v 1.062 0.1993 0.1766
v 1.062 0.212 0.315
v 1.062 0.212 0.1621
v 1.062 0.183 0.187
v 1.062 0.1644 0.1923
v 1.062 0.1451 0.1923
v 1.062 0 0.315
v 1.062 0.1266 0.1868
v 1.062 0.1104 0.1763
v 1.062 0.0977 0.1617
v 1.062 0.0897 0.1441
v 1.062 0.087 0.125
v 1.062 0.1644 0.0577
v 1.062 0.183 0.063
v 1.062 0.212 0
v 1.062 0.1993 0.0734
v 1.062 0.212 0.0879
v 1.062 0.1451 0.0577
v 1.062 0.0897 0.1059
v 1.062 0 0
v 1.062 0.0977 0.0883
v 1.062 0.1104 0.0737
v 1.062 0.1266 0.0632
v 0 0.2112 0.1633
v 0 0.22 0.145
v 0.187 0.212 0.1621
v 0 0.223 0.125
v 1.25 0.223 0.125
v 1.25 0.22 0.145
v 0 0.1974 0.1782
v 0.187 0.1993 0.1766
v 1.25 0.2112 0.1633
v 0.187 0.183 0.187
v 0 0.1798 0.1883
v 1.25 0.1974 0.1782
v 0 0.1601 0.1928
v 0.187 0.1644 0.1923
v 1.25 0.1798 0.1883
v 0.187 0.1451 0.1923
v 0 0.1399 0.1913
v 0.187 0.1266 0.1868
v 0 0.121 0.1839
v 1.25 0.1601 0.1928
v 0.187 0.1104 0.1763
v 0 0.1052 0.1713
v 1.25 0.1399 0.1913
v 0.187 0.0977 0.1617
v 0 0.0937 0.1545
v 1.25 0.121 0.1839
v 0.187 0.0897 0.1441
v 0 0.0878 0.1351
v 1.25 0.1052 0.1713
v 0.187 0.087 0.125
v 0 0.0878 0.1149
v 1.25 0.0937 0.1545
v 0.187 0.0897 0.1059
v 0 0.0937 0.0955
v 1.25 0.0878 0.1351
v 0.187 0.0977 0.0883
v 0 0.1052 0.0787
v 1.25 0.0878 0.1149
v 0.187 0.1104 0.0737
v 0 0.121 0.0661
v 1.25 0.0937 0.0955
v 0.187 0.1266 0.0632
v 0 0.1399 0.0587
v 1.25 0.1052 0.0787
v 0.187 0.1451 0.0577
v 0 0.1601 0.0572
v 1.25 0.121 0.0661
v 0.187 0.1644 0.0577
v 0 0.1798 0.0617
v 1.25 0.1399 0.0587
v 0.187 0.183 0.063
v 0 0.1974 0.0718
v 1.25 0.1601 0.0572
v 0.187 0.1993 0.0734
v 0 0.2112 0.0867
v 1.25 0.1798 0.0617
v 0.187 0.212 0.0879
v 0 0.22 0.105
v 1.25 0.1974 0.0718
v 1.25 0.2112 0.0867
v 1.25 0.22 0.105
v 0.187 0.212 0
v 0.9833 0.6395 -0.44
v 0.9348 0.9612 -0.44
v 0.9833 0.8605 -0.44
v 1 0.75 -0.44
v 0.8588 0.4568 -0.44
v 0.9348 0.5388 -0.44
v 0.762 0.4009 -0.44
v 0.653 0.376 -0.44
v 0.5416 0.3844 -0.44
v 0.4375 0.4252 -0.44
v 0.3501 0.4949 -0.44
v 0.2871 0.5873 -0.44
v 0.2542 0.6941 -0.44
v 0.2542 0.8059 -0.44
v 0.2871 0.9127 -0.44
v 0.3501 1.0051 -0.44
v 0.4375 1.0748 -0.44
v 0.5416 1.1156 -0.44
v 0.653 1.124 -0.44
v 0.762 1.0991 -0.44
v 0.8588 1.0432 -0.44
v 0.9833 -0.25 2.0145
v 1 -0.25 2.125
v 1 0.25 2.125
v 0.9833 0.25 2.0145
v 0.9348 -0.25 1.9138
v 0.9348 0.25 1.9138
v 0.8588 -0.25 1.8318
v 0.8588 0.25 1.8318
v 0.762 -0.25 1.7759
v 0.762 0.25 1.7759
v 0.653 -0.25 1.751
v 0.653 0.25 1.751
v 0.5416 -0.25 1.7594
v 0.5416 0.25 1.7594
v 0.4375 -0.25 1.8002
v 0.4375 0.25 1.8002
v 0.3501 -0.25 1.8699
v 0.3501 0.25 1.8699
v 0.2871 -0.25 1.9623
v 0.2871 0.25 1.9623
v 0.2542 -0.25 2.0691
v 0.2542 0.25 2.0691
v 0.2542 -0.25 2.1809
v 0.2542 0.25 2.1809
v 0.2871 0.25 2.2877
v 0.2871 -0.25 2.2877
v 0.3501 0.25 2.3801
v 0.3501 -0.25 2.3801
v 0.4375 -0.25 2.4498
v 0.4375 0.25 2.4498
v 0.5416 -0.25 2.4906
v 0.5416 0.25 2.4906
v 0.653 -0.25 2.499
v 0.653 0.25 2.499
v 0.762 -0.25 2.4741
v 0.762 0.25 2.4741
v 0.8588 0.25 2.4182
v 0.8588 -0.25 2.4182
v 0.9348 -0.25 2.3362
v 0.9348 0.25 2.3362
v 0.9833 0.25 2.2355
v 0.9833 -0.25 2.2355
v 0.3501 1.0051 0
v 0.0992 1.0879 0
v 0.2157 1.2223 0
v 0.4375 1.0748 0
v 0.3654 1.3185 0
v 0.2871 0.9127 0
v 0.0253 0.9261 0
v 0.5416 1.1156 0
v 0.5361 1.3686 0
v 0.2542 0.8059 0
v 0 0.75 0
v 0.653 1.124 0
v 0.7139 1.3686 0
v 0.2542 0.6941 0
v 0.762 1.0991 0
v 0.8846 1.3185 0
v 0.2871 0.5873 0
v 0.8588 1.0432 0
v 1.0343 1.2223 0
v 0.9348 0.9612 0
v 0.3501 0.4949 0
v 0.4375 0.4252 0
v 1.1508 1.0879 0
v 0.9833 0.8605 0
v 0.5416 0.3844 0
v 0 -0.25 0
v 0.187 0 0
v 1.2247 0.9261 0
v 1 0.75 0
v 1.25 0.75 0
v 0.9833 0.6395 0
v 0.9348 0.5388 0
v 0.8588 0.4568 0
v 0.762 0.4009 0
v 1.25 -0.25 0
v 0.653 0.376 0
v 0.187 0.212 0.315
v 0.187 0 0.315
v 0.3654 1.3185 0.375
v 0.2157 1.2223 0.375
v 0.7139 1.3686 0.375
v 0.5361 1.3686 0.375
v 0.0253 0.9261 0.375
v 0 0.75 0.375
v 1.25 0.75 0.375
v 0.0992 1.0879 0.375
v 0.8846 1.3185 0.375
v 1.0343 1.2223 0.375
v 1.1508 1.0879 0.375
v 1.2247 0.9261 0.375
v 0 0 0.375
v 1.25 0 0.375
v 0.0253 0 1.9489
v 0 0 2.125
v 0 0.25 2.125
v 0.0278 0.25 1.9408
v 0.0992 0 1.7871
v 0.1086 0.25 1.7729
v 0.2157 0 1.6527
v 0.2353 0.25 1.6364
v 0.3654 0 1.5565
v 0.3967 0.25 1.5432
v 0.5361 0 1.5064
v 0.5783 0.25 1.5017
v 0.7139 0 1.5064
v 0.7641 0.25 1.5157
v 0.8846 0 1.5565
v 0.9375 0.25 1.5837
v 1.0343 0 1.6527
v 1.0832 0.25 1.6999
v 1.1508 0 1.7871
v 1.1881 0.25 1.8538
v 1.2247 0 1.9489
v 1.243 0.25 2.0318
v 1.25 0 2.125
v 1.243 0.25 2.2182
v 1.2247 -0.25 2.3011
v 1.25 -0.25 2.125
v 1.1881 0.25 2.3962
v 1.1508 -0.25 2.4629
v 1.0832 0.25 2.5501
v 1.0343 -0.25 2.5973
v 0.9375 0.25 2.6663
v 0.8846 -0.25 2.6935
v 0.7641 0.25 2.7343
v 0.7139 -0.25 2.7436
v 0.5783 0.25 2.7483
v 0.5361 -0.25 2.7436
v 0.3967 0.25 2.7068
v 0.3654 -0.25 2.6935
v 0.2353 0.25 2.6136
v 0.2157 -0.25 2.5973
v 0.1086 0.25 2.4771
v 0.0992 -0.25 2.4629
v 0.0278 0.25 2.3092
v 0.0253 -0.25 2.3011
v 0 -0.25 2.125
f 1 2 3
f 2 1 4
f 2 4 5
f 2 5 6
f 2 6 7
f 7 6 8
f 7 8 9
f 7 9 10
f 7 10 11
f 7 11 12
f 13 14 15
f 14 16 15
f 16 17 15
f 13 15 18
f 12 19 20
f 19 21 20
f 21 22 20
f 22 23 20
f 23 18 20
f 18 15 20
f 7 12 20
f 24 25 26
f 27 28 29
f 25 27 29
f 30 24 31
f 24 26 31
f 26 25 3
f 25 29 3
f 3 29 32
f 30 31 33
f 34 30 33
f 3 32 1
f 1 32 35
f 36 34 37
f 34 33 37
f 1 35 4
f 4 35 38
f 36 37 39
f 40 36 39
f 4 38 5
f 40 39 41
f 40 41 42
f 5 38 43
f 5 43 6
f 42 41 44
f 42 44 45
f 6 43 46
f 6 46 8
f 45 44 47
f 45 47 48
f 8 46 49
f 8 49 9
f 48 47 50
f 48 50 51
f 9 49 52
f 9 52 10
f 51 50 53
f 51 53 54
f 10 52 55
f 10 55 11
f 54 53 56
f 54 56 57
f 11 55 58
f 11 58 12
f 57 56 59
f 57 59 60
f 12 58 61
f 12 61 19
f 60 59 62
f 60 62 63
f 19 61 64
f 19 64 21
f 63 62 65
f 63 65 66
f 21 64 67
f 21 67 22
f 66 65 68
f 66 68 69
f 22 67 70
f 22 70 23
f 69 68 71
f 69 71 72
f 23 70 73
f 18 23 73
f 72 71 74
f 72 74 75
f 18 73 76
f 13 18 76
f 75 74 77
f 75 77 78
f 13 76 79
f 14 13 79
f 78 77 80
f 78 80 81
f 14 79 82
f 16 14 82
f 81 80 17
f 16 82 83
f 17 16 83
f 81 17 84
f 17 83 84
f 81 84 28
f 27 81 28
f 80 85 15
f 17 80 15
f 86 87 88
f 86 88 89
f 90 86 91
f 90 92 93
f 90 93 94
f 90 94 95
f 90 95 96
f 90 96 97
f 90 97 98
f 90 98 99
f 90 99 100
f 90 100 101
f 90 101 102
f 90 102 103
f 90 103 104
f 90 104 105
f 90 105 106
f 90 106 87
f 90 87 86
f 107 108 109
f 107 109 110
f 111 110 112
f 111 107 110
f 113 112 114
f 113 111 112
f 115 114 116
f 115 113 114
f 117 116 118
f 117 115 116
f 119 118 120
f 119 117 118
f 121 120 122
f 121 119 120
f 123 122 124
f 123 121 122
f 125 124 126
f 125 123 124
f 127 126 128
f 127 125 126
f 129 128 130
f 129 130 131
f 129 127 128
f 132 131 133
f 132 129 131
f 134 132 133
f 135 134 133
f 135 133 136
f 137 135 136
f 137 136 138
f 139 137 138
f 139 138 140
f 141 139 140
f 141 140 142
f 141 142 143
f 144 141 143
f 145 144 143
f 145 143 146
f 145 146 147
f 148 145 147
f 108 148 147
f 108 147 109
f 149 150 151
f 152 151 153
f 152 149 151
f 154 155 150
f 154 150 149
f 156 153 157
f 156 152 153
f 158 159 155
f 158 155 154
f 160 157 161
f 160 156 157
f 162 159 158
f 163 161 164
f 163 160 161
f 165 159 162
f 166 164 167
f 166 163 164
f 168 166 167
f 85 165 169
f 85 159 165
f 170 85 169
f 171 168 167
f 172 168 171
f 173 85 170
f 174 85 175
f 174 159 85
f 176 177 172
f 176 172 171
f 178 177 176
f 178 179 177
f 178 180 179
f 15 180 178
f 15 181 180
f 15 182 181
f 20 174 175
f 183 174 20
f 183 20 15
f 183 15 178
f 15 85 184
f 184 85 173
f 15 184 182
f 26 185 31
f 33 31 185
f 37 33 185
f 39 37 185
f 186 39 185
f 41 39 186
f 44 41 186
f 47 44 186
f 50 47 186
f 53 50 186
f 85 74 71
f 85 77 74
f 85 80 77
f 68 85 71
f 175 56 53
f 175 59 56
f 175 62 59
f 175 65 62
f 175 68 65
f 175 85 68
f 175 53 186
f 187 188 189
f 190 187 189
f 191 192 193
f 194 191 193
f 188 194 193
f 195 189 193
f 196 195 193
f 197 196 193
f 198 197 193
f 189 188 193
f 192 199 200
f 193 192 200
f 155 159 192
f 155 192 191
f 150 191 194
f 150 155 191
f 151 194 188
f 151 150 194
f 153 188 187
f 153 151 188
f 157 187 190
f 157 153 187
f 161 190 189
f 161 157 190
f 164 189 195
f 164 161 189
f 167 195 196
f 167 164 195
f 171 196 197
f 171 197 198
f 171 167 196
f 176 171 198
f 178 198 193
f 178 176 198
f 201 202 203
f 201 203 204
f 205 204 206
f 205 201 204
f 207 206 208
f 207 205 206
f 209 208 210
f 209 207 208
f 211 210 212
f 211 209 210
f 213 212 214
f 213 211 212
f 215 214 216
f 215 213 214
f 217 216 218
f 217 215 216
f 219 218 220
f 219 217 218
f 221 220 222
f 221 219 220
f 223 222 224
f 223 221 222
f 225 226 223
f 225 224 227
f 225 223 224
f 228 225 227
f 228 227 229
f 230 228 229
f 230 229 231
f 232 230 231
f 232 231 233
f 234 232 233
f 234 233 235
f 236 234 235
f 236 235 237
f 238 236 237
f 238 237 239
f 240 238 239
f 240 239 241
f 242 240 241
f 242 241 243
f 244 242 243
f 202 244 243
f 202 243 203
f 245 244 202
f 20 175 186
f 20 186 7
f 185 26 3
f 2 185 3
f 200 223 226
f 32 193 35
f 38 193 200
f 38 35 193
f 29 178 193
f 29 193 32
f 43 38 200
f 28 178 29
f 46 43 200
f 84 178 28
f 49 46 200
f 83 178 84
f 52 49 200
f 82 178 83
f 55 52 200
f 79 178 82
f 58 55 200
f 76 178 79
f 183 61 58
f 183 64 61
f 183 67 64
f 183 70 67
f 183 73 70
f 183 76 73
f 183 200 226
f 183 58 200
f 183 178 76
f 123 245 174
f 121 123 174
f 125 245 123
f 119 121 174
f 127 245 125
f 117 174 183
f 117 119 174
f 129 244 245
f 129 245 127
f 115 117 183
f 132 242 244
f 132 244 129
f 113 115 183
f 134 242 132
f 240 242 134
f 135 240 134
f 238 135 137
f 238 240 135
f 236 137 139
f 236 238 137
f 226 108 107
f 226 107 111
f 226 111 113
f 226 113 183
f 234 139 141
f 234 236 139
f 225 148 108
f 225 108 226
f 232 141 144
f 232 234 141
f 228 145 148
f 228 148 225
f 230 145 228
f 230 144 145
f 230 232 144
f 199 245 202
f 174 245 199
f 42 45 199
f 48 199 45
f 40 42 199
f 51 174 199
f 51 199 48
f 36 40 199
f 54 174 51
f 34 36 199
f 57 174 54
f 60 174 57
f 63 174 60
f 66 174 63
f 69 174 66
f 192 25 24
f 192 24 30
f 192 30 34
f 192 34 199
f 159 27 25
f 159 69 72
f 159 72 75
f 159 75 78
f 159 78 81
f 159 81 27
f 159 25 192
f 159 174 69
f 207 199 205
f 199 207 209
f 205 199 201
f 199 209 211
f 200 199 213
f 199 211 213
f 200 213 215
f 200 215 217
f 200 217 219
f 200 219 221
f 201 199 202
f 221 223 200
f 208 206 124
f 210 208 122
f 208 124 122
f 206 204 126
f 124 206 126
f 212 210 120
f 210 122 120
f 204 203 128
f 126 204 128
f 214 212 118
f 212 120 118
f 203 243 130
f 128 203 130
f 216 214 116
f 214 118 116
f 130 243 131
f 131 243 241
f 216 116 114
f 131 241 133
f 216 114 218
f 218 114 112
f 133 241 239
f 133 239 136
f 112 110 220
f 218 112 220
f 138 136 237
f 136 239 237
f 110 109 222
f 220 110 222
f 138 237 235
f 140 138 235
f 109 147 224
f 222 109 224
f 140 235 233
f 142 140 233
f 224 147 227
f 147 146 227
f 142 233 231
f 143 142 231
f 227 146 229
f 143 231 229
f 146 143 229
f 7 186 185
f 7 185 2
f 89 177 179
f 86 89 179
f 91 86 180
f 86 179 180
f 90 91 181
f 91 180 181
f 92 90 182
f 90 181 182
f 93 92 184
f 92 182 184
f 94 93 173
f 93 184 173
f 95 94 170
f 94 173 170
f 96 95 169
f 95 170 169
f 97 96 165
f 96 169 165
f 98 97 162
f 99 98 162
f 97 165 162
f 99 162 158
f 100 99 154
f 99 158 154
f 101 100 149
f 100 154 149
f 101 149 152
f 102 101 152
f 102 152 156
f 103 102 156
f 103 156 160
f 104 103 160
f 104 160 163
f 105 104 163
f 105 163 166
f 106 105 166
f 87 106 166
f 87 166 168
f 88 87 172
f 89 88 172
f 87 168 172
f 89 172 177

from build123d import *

# Parameters (mm, degrees)
F0_W      = 1.25
F0_H      = 2.125
F1_DEPTH  = 0.25
F3_DEPTH  = 0.5
F5_DEPTH  = 25
F7_DEPTH  = 0.375
F8_R      = 0.375
F9_DEPTH  = 0.44
F10_W     = 0.875
F10_H     = 0.2119794213
F11_DEPTH = 0.315
F12_R     = 0.068
F13_DEPTH = 1.251


with BuildPart() as f1:
    # F0 (on Front) → F1 (new body)
    with BuildSketch(Plane.XZ):
        with Locations((0.625, 1.0625)):
            Rectangle(F0_W, F0_H)
    extrude(amount=F1_DEPTH)

    # F2 (on face) → F3 (join)
    with BuildSketch(Plane.XZ.offset(0.25)):
        with BuildLine():
            Line((1, 2.125), (1.25, 2.125))
            ThreePointArc((1.25, 2.125), (0.625, 2.75), (0, 2.125))
            Line((0, 2.125), (0.25, 2.125))
            ThreePointArc((0.25, 2.125), (0.625, 2.5), (1, 2.125))
        make_face()
        with BuildLine():
            ThreePointArc((0, 2.125), (0.625, 1.5), (1.25, 2.125))
            Line((1.25, 2.125), (1, 2.125))
            ThreePointArc((1, 2.125), (0.625, 1.75), (0.25, 2.125))
            Line((0.25, 2.125), (0, 2.125))
        make_face()
    extrude(amount=-F3_DEPTH)

    # F4 (on face) → F5 (cut)
    with BuildSketch(Plane(origin=(0, 0, 0), x_dir=(-1, 0, 0), z_dir=(0, 1, 0))):
        with BuildLine():
            Line((-0.25, 2.125), (-1, 2.125))
            ThreePointArc((-1, 2.125), (-0.625, 1.75), (-0.25, 2.125))
        make_face()
    extrude(amount=-F5_DEPTH, mode=Mode.SUBTRACT)

    # F6 (on face) → F7 (join)
    with BuildSketch(Plane(origin=(0, 0, 0), x_dir=(1, 0, 0), z_dir=(0, 0, -1))):
        with BuildLine():
            Line((1.25, -0.75), (1.25, 0.25))
            Line((1.25, 0.25), (0, 0.25))
            Line((0, 0.25), (0, -0.75))
            ThreePointArc((0, -0.75), (0.625, -1.375), (1.25, -0.75))
        make_face()
    extrude(amount=-F7_DEPTH)

    # F8 (on face) → F9 (join)
    with BuildSketch(Plane(origin=(0, 0, 0), x_dir=(1, 0, 0), z_dir=(0, 0, -1))):
        with Locations((0.625, -0.75)):
            Circle(F8_R)
    extrude(amount=F9_DEPTH)

    # F10 (on face) → F11 (cut)
    with BuildSketch(Plane(origin=(0, 0, 0), x_dir=(1, 0, 0), z_dir=(0, 0, -1))):
        with Locations((0.6245, -0.1059897106)):
            Rectangle(F10_W, F10_H)
    extrude(amount=-F11_DEPTH, mode=Mode.SUBTRACT)

    # F12 (on face) → F13 (cut, through all)
    with BuildSketch(Plane.YZ.offset(1.25)):
        with Locations((0.155, 0.125)):
            Circle(F12_R)
    extrude(amount=-F13_DEPTH, mode=Mode.SUBTRACT)


solid = f1.part
